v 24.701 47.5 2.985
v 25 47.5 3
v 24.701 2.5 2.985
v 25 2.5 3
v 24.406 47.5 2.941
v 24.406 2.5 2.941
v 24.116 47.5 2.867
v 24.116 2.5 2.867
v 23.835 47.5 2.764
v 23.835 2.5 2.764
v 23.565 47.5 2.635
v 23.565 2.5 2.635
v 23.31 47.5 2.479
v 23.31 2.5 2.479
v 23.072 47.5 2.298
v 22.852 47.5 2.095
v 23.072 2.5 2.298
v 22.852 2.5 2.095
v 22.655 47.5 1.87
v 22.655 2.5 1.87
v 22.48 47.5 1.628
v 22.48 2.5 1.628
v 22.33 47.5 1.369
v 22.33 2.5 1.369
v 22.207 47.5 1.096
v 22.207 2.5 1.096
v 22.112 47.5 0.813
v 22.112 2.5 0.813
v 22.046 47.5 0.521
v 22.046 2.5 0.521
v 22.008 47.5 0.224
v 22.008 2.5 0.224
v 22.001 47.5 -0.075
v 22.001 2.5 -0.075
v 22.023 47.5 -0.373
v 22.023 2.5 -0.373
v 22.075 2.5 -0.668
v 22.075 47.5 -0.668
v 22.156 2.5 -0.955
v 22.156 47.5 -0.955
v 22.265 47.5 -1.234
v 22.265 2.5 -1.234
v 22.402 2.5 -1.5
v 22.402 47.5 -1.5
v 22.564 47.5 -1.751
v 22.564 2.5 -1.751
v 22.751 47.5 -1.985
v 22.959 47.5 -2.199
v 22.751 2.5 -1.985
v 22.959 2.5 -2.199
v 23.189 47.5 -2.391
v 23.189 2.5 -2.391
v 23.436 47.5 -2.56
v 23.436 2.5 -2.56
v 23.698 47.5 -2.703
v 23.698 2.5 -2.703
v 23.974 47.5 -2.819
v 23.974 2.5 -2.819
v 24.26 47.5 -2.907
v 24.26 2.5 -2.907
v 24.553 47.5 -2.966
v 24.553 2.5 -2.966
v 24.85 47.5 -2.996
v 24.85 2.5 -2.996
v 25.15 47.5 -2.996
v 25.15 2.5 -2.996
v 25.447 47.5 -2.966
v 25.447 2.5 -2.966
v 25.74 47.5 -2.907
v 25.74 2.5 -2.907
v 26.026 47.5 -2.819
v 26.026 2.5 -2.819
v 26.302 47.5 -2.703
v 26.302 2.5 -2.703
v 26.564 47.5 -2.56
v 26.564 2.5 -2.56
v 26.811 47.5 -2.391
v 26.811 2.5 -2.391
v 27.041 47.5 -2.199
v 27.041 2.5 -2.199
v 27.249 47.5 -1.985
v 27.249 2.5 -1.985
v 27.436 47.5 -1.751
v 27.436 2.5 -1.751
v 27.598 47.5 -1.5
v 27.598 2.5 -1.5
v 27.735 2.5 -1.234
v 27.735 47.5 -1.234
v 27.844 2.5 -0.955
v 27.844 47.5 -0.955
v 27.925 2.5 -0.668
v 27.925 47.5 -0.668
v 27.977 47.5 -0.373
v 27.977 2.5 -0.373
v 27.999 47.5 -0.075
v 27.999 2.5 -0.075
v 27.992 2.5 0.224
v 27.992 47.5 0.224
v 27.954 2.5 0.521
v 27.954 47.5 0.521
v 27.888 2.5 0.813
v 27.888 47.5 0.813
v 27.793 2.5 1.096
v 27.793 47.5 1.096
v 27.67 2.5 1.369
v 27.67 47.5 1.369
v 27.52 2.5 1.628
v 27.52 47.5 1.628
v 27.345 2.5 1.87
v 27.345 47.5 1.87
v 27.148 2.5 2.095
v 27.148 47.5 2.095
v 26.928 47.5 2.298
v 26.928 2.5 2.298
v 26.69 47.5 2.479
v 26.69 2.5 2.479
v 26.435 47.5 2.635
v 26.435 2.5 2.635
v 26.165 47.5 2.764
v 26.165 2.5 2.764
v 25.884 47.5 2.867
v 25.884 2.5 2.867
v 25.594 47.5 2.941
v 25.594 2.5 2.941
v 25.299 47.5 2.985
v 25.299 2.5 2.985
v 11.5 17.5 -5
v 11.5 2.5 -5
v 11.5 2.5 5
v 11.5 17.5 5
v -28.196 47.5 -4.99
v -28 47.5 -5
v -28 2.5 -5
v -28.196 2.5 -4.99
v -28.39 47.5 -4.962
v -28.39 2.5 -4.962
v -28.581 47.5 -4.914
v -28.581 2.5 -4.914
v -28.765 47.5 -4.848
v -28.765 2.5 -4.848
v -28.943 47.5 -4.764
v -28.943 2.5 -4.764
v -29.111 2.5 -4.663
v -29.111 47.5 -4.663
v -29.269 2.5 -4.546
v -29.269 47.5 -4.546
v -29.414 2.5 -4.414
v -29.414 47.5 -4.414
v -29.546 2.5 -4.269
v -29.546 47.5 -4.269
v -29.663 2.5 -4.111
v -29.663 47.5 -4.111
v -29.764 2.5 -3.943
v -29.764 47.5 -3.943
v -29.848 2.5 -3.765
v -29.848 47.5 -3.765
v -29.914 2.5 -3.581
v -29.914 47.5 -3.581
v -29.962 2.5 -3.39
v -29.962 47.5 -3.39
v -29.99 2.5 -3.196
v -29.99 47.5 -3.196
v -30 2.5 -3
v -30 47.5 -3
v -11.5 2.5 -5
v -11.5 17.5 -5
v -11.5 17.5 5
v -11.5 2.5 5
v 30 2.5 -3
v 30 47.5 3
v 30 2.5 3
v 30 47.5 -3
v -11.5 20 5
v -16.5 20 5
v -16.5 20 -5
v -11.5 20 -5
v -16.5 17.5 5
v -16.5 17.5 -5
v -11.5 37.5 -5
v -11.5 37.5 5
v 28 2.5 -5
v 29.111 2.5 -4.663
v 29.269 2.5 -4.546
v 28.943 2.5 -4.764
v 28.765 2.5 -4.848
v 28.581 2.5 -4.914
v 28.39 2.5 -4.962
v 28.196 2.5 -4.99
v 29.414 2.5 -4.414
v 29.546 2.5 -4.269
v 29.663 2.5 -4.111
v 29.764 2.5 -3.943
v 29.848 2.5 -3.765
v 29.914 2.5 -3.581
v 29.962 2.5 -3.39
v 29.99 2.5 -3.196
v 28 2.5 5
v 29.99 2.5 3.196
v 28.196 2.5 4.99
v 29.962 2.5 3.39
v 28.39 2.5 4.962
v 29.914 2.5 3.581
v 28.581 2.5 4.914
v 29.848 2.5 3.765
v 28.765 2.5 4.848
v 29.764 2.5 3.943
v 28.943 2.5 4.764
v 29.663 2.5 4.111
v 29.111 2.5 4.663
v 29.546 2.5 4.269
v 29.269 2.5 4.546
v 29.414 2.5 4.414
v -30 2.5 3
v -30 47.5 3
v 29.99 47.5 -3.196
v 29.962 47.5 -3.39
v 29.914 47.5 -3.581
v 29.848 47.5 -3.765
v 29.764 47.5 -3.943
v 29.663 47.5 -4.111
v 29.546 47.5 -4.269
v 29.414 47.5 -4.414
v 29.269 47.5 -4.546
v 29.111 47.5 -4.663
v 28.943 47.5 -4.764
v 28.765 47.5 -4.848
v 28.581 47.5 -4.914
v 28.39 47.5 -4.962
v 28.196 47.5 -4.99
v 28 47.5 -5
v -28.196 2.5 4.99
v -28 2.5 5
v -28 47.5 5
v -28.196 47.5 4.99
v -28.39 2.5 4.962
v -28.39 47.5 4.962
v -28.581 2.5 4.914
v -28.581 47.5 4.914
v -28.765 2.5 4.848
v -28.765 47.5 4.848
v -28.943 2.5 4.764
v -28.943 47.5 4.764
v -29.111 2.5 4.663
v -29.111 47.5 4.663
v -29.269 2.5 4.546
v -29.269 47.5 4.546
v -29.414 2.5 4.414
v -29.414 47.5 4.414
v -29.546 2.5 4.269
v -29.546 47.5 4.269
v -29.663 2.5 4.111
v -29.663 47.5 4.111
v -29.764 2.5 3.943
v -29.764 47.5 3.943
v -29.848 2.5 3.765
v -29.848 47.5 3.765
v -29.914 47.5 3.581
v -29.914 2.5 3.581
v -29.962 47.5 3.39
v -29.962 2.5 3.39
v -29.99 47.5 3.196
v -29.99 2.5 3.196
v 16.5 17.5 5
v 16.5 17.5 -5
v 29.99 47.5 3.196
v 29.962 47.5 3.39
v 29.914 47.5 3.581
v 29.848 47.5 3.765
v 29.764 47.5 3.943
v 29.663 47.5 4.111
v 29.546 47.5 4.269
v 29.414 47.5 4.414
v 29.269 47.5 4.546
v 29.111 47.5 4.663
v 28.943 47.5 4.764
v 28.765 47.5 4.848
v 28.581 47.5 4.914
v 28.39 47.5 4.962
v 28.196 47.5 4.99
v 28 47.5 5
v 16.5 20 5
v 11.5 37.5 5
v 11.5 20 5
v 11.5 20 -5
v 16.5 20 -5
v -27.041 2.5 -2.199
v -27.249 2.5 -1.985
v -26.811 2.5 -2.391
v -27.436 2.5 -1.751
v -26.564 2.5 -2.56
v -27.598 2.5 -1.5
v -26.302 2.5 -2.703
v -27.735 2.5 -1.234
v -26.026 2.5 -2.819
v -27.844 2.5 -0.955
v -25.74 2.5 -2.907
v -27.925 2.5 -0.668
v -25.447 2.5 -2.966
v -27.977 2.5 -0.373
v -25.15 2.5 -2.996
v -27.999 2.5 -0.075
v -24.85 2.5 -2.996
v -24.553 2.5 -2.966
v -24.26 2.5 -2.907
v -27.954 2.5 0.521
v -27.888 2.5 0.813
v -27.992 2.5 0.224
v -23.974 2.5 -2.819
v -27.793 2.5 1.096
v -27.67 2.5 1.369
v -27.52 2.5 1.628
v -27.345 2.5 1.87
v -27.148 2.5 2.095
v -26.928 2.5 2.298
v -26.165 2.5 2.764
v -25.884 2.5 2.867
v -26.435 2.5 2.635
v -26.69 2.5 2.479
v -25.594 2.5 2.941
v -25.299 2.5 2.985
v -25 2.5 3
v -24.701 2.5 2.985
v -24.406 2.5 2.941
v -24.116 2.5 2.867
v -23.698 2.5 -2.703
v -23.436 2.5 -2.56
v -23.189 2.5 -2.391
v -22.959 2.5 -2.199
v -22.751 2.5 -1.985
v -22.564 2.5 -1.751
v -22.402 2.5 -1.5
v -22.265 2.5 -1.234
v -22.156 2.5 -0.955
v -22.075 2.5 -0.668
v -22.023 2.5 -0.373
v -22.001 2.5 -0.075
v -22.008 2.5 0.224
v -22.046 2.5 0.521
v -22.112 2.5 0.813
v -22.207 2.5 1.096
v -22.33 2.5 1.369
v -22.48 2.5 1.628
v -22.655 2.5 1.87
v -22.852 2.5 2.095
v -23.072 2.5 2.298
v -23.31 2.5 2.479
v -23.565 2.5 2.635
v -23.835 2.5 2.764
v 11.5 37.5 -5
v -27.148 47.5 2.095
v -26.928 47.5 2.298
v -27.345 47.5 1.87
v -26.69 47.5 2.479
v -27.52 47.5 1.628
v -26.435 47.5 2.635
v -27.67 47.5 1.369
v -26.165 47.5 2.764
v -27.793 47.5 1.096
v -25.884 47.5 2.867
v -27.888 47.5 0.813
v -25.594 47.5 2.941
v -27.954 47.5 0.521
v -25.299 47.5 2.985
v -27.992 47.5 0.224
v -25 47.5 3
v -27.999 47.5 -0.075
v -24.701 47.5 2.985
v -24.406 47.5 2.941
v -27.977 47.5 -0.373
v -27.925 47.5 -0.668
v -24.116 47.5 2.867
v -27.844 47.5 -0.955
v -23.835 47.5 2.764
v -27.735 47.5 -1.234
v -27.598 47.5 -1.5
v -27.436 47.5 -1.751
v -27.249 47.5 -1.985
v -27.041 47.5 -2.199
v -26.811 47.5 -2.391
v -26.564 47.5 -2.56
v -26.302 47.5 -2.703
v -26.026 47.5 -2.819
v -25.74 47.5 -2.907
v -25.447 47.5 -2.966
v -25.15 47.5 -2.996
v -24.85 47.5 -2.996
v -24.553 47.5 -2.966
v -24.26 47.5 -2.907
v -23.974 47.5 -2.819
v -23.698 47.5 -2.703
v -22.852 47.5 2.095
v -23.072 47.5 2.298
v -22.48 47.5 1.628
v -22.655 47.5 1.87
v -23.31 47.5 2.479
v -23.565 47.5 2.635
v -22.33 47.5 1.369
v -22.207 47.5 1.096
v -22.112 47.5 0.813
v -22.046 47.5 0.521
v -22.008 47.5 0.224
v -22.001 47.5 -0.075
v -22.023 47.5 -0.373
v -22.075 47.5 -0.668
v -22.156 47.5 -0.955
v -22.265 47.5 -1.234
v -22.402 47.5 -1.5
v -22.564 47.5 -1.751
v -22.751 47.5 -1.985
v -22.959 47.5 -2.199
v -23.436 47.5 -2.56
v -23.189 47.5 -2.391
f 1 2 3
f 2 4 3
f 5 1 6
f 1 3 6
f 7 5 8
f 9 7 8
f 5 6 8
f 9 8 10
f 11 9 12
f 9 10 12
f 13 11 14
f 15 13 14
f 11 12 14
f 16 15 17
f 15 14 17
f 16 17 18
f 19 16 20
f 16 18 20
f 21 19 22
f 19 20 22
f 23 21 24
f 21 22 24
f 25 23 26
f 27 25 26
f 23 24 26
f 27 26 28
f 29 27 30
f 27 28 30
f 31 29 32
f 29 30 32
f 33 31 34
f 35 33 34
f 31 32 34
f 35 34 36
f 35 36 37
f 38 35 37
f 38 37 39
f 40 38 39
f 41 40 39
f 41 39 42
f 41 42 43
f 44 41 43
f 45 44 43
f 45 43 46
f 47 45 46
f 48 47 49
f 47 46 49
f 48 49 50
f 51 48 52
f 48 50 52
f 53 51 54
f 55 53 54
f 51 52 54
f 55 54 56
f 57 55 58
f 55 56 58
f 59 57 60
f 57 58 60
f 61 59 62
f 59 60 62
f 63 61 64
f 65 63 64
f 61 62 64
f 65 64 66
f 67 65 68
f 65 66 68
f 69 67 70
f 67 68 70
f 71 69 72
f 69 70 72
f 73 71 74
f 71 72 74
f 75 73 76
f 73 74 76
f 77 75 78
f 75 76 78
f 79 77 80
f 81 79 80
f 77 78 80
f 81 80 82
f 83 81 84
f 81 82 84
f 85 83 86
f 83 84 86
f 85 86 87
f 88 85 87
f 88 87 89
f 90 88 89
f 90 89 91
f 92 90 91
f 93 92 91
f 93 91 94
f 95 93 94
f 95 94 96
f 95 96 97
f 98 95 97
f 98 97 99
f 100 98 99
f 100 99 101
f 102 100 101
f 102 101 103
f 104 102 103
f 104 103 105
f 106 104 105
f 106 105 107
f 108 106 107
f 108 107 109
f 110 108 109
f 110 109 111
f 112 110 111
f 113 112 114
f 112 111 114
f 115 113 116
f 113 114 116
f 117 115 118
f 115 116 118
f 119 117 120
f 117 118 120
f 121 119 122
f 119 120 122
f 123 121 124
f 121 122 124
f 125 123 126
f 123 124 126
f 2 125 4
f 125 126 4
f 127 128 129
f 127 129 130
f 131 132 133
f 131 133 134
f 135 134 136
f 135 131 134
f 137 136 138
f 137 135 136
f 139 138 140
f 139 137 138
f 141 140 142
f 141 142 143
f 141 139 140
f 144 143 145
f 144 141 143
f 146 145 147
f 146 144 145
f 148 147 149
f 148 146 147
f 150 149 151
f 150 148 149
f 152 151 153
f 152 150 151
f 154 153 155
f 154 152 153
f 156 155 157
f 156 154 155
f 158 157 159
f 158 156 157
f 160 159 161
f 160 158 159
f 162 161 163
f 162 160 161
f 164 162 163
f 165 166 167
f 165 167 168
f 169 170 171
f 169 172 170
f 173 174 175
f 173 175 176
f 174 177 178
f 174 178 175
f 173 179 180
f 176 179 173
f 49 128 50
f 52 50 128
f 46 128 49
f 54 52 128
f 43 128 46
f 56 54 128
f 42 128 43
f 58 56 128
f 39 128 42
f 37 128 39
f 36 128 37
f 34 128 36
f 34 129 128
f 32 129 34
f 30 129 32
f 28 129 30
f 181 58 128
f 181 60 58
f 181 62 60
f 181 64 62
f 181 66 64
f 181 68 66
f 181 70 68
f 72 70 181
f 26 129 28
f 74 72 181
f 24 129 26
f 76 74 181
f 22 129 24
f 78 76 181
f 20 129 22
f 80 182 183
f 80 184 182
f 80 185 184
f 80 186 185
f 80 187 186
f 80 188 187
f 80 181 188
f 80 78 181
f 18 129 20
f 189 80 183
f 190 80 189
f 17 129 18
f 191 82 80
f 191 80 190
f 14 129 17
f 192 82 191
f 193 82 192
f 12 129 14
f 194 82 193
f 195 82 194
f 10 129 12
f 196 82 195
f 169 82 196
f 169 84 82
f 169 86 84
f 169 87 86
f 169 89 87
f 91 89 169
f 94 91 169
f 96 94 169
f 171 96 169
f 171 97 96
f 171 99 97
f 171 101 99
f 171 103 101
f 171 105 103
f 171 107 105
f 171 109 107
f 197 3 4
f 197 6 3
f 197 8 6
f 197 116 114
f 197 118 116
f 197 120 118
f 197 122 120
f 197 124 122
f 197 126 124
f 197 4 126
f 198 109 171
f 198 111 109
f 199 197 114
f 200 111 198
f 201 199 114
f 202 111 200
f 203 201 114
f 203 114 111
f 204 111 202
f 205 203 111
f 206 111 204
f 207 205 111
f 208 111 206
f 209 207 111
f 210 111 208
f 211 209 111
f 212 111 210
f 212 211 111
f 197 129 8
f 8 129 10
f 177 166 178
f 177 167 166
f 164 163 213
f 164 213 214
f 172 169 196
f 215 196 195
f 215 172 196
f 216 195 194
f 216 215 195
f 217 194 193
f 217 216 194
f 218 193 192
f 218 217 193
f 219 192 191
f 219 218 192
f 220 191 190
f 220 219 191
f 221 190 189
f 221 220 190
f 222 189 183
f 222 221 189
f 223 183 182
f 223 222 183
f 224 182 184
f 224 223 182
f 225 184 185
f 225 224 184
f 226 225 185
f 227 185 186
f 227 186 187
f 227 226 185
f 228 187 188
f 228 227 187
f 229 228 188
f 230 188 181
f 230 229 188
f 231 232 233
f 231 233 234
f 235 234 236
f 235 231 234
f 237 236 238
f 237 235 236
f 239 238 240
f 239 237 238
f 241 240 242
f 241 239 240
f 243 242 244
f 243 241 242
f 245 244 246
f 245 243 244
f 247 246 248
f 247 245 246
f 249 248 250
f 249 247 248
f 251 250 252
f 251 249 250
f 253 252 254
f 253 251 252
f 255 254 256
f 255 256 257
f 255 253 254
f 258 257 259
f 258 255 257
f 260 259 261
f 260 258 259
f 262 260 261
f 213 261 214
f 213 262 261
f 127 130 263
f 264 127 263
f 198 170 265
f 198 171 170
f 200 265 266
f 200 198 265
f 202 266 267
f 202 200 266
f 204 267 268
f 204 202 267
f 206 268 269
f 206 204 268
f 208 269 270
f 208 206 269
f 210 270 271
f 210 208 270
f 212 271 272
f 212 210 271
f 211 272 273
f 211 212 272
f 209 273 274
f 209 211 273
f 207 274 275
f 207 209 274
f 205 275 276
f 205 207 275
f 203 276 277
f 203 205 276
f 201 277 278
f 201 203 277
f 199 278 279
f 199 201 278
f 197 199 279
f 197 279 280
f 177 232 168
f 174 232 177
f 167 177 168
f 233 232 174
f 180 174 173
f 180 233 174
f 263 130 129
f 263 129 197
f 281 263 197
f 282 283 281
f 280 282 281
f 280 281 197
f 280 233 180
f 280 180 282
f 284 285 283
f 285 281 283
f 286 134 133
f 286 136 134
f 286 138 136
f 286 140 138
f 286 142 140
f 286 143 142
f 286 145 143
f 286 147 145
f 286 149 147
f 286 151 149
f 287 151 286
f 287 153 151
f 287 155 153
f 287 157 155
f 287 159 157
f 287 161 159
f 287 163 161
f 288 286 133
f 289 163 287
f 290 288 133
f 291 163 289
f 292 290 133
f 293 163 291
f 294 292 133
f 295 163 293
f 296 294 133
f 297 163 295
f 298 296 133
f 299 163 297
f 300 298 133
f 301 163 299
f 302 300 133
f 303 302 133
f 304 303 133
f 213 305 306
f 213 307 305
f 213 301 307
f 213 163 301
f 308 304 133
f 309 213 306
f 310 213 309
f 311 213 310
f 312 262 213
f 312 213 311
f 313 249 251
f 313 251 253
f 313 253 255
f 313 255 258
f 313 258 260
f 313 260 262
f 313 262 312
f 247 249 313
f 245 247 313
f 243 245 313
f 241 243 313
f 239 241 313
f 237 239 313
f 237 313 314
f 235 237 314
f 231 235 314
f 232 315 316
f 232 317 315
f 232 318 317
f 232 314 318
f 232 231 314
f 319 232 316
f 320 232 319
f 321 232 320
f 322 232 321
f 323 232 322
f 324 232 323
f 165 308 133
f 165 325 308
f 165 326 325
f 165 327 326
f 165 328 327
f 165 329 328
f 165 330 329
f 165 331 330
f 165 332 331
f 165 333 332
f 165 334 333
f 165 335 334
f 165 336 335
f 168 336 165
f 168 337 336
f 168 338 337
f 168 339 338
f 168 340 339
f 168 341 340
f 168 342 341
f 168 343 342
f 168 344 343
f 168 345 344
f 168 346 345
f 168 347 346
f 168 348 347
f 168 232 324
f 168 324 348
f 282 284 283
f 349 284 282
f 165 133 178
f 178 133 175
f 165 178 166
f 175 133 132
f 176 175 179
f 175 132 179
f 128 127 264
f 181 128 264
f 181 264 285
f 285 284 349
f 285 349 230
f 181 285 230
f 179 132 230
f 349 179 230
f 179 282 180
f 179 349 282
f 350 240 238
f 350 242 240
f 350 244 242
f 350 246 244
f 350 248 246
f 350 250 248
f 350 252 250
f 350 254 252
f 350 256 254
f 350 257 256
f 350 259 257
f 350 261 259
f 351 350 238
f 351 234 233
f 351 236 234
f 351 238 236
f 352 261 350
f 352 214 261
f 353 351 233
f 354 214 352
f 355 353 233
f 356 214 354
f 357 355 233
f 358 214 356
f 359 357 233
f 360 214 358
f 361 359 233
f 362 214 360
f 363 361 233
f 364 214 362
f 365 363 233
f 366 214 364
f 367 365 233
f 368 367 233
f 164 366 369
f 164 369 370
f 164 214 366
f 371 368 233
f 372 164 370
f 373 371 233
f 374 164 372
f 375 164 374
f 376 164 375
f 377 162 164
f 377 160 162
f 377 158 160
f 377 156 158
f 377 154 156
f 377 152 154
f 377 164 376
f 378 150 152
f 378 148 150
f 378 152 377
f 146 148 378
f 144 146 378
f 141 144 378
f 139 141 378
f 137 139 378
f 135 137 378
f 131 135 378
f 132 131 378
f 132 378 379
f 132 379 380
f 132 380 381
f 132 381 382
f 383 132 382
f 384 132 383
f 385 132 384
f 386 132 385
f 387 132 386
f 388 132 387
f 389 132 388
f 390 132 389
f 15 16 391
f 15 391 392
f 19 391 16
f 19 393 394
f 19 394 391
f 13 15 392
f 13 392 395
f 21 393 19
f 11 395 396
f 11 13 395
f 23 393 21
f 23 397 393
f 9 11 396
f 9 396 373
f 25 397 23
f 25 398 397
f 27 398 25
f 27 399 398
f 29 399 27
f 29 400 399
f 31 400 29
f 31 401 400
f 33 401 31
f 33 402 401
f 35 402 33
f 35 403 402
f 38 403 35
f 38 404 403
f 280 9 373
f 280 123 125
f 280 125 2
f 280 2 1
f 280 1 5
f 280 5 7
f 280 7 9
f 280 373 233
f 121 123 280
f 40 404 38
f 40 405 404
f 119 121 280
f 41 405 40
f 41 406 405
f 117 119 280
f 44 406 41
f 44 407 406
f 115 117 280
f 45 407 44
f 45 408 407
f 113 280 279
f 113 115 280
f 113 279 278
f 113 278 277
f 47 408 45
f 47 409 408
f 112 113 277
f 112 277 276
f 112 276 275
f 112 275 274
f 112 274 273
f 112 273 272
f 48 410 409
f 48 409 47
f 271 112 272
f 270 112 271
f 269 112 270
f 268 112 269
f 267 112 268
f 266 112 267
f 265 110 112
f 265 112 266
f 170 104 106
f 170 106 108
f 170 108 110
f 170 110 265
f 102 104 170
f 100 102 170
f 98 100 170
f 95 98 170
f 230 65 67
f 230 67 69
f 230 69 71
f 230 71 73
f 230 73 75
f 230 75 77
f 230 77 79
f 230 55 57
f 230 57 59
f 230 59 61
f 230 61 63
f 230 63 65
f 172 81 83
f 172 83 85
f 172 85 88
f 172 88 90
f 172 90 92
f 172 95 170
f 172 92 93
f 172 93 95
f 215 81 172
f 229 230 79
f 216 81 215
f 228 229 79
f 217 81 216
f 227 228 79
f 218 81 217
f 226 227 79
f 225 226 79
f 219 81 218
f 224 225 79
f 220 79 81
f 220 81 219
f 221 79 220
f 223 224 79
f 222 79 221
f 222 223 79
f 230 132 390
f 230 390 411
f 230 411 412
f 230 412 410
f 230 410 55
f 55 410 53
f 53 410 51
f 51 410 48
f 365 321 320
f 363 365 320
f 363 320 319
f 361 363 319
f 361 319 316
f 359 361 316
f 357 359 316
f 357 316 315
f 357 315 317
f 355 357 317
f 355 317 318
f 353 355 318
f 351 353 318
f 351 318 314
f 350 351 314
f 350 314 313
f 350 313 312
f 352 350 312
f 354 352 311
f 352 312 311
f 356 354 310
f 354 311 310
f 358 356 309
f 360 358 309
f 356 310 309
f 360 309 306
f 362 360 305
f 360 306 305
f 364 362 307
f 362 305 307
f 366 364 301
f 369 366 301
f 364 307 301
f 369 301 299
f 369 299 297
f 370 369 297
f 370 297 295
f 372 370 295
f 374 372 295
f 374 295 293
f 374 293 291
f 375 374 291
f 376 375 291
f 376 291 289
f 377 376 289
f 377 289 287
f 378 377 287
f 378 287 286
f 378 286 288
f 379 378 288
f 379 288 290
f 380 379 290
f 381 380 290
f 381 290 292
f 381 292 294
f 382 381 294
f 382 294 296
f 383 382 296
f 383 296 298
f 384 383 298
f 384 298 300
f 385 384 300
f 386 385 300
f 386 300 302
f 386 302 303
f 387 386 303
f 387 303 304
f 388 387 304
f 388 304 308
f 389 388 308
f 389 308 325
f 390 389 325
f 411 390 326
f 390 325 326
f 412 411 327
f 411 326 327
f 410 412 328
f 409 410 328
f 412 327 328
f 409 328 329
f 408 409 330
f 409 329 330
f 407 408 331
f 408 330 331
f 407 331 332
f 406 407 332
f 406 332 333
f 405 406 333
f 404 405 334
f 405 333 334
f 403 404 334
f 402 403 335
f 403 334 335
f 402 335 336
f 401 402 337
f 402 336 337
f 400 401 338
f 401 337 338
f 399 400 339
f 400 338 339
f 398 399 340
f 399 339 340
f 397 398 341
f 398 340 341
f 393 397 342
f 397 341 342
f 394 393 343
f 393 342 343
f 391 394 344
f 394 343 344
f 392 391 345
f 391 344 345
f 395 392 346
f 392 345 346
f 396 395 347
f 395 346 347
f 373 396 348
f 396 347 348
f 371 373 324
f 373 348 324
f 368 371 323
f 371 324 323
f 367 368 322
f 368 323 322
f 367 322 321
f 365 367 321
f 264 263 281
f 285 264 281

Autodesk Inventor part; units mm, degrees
ref_plane "YZ Plane" through (0, 0, 0) normal (1, 0, 0) x (0, 1, 0)
ref_plane "XZ Plane" through (0, 0, 0) normal (0, 1, 0) x (-1, 0, 0)
ref_plane "XY Plane" through (0, 0, 0) normal (0, 0, 1) x (1, 0, 0)
sketch "Náčrt1" plane through (0, 0, 0) normal (0, 0, 1) x (1, 0, 0)
  line L0 (30, -47.5) -> (-30, -47.5)
  line L1 (-30, -47.5) -> (-30, 47.5)
  line L2 (-30, 47.5) -> (30, 47.5)
  line L3 (30, 47.5) -> (30, -47.5)
  line L4 (30, -47.5) -> (-30, 47.5) construction
  line L5 (-30, -47.5) -> (30, 47.5) construction
  line L6 (-11.5, -37.5) -> (11.5, -37.5)
  line L7 (11.5, -37.5) -> (11.5, 37.5)
  line L8 (11.5, 37.5) -> (-11.5, 37.5)
  line L9 (-11.5, 37.5) -> (-11.5, -37.5)
  line L10 (-11.5, -37.5) -> (11.5, 37.5) construction
  line L11 (11.5, -37.5) -> (-11.5, 37.5) construction
  line L12 (0, 66.5) -> (0, -66.5) projected
  line L13 (-42, 0) -> (42, 0) projected
  point P0 (0, 0)
  point P1 (0, 0)
  dimension "d25" = 60
  dimension "d26" = 95
  dimension "d27" = 23
  dimension "d56" = 10
extrude "Vysunutí1" add sketch "Náčrt1" along normal mid plane 10 contours L0 L12 L6 L7 L13 L3 | L0 L1 L13 L9 L6 L12 | L13 L7 L8 L12 L2 L3 | L1 L2 L12 L8 L9 L13
sketch "Náčrt2" plane through (-30, 47.5, 5) normal (0, 1, 0) x (1, 0, 0)
  point P0 (5, 5)
  point P1 (55, 5)
hole "Díra1" at (-25, 47.5, 0) at (25, 47.5, 0) direction (0, -1, 0) diameter 6 end through all
fillet "Zaoblení1" radius 2 4 edges at (-30, 0, 5) (-30, 0, -5) (30, 0, -5) (30, 0, 5)
sketch "Náčrt3" plane through (0, 0, 5) normal (0, 0, 1) x (1, 0, 0)
  line L0 (11.5, 37.5) -> (11.5, -37.5) projected
  line L1 (11.5, 17.5) -> (16.5, 17.5)
  line L2 (16.5, 17.5) -> (16.5, 20)
  line L3 (16.5, 20) -> (11.5, 20)
  line L4 (11.5, 20) -> (11.5, 17.5)
  line L5 (-42, 0) -> (42, 0) projected
  line L6 (0, 66.5) -> (0, -66.5) projected
  line L7 (-11.5, 37.5) -> (11.5, 37.5) projected
  line L8 (28, 47.5) -> (-28, 47.5) projected
  line L9 (-11.5, 17.5) -> (-16.5, 17.5)
  line L10 (-16.5, 17.5) -> (-16.5, 20)
  line L11 (-16.5, 20) -> (-11.5, 20)
  line L12 (-11.5, 20) -> (-11.5, 17.5)
  point P0 (0, 0)
  point P1 (14, 20)
  point P2 (-14, 20)
  dimension "d47" = 5
  dimension "d48" = 2.5
  dimension "d50" = 27.5
extrude "Vysunutí3" cut sketch "Náčrt3" against normal blind 27.5 contours L3 L2 L1 L0 | L9 L10 L11 L12
sketch "Náčrt4" plane through (0, 0, 5) normal (0, 0, 1) x (1, 0, 0)
  line L0 (30, -47.5) -> (28, -47.5) projected
  line L1 (-30, 47.5) -> (-30, -47.5) projected
  line L2 (30, -47.5) -> (-30, -47.5)
  line L3 (-30, -47.5) -> (-30, 2.5)
  line L4 (-30, 2.5) -> (30, 2.5)
  line L5 (30, 2.5) -> (30, -47.5)
  point P0 (0, 0)
  dimension "d53" = 50
extrude "Vysunutí4" cut sketch "Náčrt4" against normal blind 10
equation "\"d51\" = d50"
properties part number "SERVO držák"
